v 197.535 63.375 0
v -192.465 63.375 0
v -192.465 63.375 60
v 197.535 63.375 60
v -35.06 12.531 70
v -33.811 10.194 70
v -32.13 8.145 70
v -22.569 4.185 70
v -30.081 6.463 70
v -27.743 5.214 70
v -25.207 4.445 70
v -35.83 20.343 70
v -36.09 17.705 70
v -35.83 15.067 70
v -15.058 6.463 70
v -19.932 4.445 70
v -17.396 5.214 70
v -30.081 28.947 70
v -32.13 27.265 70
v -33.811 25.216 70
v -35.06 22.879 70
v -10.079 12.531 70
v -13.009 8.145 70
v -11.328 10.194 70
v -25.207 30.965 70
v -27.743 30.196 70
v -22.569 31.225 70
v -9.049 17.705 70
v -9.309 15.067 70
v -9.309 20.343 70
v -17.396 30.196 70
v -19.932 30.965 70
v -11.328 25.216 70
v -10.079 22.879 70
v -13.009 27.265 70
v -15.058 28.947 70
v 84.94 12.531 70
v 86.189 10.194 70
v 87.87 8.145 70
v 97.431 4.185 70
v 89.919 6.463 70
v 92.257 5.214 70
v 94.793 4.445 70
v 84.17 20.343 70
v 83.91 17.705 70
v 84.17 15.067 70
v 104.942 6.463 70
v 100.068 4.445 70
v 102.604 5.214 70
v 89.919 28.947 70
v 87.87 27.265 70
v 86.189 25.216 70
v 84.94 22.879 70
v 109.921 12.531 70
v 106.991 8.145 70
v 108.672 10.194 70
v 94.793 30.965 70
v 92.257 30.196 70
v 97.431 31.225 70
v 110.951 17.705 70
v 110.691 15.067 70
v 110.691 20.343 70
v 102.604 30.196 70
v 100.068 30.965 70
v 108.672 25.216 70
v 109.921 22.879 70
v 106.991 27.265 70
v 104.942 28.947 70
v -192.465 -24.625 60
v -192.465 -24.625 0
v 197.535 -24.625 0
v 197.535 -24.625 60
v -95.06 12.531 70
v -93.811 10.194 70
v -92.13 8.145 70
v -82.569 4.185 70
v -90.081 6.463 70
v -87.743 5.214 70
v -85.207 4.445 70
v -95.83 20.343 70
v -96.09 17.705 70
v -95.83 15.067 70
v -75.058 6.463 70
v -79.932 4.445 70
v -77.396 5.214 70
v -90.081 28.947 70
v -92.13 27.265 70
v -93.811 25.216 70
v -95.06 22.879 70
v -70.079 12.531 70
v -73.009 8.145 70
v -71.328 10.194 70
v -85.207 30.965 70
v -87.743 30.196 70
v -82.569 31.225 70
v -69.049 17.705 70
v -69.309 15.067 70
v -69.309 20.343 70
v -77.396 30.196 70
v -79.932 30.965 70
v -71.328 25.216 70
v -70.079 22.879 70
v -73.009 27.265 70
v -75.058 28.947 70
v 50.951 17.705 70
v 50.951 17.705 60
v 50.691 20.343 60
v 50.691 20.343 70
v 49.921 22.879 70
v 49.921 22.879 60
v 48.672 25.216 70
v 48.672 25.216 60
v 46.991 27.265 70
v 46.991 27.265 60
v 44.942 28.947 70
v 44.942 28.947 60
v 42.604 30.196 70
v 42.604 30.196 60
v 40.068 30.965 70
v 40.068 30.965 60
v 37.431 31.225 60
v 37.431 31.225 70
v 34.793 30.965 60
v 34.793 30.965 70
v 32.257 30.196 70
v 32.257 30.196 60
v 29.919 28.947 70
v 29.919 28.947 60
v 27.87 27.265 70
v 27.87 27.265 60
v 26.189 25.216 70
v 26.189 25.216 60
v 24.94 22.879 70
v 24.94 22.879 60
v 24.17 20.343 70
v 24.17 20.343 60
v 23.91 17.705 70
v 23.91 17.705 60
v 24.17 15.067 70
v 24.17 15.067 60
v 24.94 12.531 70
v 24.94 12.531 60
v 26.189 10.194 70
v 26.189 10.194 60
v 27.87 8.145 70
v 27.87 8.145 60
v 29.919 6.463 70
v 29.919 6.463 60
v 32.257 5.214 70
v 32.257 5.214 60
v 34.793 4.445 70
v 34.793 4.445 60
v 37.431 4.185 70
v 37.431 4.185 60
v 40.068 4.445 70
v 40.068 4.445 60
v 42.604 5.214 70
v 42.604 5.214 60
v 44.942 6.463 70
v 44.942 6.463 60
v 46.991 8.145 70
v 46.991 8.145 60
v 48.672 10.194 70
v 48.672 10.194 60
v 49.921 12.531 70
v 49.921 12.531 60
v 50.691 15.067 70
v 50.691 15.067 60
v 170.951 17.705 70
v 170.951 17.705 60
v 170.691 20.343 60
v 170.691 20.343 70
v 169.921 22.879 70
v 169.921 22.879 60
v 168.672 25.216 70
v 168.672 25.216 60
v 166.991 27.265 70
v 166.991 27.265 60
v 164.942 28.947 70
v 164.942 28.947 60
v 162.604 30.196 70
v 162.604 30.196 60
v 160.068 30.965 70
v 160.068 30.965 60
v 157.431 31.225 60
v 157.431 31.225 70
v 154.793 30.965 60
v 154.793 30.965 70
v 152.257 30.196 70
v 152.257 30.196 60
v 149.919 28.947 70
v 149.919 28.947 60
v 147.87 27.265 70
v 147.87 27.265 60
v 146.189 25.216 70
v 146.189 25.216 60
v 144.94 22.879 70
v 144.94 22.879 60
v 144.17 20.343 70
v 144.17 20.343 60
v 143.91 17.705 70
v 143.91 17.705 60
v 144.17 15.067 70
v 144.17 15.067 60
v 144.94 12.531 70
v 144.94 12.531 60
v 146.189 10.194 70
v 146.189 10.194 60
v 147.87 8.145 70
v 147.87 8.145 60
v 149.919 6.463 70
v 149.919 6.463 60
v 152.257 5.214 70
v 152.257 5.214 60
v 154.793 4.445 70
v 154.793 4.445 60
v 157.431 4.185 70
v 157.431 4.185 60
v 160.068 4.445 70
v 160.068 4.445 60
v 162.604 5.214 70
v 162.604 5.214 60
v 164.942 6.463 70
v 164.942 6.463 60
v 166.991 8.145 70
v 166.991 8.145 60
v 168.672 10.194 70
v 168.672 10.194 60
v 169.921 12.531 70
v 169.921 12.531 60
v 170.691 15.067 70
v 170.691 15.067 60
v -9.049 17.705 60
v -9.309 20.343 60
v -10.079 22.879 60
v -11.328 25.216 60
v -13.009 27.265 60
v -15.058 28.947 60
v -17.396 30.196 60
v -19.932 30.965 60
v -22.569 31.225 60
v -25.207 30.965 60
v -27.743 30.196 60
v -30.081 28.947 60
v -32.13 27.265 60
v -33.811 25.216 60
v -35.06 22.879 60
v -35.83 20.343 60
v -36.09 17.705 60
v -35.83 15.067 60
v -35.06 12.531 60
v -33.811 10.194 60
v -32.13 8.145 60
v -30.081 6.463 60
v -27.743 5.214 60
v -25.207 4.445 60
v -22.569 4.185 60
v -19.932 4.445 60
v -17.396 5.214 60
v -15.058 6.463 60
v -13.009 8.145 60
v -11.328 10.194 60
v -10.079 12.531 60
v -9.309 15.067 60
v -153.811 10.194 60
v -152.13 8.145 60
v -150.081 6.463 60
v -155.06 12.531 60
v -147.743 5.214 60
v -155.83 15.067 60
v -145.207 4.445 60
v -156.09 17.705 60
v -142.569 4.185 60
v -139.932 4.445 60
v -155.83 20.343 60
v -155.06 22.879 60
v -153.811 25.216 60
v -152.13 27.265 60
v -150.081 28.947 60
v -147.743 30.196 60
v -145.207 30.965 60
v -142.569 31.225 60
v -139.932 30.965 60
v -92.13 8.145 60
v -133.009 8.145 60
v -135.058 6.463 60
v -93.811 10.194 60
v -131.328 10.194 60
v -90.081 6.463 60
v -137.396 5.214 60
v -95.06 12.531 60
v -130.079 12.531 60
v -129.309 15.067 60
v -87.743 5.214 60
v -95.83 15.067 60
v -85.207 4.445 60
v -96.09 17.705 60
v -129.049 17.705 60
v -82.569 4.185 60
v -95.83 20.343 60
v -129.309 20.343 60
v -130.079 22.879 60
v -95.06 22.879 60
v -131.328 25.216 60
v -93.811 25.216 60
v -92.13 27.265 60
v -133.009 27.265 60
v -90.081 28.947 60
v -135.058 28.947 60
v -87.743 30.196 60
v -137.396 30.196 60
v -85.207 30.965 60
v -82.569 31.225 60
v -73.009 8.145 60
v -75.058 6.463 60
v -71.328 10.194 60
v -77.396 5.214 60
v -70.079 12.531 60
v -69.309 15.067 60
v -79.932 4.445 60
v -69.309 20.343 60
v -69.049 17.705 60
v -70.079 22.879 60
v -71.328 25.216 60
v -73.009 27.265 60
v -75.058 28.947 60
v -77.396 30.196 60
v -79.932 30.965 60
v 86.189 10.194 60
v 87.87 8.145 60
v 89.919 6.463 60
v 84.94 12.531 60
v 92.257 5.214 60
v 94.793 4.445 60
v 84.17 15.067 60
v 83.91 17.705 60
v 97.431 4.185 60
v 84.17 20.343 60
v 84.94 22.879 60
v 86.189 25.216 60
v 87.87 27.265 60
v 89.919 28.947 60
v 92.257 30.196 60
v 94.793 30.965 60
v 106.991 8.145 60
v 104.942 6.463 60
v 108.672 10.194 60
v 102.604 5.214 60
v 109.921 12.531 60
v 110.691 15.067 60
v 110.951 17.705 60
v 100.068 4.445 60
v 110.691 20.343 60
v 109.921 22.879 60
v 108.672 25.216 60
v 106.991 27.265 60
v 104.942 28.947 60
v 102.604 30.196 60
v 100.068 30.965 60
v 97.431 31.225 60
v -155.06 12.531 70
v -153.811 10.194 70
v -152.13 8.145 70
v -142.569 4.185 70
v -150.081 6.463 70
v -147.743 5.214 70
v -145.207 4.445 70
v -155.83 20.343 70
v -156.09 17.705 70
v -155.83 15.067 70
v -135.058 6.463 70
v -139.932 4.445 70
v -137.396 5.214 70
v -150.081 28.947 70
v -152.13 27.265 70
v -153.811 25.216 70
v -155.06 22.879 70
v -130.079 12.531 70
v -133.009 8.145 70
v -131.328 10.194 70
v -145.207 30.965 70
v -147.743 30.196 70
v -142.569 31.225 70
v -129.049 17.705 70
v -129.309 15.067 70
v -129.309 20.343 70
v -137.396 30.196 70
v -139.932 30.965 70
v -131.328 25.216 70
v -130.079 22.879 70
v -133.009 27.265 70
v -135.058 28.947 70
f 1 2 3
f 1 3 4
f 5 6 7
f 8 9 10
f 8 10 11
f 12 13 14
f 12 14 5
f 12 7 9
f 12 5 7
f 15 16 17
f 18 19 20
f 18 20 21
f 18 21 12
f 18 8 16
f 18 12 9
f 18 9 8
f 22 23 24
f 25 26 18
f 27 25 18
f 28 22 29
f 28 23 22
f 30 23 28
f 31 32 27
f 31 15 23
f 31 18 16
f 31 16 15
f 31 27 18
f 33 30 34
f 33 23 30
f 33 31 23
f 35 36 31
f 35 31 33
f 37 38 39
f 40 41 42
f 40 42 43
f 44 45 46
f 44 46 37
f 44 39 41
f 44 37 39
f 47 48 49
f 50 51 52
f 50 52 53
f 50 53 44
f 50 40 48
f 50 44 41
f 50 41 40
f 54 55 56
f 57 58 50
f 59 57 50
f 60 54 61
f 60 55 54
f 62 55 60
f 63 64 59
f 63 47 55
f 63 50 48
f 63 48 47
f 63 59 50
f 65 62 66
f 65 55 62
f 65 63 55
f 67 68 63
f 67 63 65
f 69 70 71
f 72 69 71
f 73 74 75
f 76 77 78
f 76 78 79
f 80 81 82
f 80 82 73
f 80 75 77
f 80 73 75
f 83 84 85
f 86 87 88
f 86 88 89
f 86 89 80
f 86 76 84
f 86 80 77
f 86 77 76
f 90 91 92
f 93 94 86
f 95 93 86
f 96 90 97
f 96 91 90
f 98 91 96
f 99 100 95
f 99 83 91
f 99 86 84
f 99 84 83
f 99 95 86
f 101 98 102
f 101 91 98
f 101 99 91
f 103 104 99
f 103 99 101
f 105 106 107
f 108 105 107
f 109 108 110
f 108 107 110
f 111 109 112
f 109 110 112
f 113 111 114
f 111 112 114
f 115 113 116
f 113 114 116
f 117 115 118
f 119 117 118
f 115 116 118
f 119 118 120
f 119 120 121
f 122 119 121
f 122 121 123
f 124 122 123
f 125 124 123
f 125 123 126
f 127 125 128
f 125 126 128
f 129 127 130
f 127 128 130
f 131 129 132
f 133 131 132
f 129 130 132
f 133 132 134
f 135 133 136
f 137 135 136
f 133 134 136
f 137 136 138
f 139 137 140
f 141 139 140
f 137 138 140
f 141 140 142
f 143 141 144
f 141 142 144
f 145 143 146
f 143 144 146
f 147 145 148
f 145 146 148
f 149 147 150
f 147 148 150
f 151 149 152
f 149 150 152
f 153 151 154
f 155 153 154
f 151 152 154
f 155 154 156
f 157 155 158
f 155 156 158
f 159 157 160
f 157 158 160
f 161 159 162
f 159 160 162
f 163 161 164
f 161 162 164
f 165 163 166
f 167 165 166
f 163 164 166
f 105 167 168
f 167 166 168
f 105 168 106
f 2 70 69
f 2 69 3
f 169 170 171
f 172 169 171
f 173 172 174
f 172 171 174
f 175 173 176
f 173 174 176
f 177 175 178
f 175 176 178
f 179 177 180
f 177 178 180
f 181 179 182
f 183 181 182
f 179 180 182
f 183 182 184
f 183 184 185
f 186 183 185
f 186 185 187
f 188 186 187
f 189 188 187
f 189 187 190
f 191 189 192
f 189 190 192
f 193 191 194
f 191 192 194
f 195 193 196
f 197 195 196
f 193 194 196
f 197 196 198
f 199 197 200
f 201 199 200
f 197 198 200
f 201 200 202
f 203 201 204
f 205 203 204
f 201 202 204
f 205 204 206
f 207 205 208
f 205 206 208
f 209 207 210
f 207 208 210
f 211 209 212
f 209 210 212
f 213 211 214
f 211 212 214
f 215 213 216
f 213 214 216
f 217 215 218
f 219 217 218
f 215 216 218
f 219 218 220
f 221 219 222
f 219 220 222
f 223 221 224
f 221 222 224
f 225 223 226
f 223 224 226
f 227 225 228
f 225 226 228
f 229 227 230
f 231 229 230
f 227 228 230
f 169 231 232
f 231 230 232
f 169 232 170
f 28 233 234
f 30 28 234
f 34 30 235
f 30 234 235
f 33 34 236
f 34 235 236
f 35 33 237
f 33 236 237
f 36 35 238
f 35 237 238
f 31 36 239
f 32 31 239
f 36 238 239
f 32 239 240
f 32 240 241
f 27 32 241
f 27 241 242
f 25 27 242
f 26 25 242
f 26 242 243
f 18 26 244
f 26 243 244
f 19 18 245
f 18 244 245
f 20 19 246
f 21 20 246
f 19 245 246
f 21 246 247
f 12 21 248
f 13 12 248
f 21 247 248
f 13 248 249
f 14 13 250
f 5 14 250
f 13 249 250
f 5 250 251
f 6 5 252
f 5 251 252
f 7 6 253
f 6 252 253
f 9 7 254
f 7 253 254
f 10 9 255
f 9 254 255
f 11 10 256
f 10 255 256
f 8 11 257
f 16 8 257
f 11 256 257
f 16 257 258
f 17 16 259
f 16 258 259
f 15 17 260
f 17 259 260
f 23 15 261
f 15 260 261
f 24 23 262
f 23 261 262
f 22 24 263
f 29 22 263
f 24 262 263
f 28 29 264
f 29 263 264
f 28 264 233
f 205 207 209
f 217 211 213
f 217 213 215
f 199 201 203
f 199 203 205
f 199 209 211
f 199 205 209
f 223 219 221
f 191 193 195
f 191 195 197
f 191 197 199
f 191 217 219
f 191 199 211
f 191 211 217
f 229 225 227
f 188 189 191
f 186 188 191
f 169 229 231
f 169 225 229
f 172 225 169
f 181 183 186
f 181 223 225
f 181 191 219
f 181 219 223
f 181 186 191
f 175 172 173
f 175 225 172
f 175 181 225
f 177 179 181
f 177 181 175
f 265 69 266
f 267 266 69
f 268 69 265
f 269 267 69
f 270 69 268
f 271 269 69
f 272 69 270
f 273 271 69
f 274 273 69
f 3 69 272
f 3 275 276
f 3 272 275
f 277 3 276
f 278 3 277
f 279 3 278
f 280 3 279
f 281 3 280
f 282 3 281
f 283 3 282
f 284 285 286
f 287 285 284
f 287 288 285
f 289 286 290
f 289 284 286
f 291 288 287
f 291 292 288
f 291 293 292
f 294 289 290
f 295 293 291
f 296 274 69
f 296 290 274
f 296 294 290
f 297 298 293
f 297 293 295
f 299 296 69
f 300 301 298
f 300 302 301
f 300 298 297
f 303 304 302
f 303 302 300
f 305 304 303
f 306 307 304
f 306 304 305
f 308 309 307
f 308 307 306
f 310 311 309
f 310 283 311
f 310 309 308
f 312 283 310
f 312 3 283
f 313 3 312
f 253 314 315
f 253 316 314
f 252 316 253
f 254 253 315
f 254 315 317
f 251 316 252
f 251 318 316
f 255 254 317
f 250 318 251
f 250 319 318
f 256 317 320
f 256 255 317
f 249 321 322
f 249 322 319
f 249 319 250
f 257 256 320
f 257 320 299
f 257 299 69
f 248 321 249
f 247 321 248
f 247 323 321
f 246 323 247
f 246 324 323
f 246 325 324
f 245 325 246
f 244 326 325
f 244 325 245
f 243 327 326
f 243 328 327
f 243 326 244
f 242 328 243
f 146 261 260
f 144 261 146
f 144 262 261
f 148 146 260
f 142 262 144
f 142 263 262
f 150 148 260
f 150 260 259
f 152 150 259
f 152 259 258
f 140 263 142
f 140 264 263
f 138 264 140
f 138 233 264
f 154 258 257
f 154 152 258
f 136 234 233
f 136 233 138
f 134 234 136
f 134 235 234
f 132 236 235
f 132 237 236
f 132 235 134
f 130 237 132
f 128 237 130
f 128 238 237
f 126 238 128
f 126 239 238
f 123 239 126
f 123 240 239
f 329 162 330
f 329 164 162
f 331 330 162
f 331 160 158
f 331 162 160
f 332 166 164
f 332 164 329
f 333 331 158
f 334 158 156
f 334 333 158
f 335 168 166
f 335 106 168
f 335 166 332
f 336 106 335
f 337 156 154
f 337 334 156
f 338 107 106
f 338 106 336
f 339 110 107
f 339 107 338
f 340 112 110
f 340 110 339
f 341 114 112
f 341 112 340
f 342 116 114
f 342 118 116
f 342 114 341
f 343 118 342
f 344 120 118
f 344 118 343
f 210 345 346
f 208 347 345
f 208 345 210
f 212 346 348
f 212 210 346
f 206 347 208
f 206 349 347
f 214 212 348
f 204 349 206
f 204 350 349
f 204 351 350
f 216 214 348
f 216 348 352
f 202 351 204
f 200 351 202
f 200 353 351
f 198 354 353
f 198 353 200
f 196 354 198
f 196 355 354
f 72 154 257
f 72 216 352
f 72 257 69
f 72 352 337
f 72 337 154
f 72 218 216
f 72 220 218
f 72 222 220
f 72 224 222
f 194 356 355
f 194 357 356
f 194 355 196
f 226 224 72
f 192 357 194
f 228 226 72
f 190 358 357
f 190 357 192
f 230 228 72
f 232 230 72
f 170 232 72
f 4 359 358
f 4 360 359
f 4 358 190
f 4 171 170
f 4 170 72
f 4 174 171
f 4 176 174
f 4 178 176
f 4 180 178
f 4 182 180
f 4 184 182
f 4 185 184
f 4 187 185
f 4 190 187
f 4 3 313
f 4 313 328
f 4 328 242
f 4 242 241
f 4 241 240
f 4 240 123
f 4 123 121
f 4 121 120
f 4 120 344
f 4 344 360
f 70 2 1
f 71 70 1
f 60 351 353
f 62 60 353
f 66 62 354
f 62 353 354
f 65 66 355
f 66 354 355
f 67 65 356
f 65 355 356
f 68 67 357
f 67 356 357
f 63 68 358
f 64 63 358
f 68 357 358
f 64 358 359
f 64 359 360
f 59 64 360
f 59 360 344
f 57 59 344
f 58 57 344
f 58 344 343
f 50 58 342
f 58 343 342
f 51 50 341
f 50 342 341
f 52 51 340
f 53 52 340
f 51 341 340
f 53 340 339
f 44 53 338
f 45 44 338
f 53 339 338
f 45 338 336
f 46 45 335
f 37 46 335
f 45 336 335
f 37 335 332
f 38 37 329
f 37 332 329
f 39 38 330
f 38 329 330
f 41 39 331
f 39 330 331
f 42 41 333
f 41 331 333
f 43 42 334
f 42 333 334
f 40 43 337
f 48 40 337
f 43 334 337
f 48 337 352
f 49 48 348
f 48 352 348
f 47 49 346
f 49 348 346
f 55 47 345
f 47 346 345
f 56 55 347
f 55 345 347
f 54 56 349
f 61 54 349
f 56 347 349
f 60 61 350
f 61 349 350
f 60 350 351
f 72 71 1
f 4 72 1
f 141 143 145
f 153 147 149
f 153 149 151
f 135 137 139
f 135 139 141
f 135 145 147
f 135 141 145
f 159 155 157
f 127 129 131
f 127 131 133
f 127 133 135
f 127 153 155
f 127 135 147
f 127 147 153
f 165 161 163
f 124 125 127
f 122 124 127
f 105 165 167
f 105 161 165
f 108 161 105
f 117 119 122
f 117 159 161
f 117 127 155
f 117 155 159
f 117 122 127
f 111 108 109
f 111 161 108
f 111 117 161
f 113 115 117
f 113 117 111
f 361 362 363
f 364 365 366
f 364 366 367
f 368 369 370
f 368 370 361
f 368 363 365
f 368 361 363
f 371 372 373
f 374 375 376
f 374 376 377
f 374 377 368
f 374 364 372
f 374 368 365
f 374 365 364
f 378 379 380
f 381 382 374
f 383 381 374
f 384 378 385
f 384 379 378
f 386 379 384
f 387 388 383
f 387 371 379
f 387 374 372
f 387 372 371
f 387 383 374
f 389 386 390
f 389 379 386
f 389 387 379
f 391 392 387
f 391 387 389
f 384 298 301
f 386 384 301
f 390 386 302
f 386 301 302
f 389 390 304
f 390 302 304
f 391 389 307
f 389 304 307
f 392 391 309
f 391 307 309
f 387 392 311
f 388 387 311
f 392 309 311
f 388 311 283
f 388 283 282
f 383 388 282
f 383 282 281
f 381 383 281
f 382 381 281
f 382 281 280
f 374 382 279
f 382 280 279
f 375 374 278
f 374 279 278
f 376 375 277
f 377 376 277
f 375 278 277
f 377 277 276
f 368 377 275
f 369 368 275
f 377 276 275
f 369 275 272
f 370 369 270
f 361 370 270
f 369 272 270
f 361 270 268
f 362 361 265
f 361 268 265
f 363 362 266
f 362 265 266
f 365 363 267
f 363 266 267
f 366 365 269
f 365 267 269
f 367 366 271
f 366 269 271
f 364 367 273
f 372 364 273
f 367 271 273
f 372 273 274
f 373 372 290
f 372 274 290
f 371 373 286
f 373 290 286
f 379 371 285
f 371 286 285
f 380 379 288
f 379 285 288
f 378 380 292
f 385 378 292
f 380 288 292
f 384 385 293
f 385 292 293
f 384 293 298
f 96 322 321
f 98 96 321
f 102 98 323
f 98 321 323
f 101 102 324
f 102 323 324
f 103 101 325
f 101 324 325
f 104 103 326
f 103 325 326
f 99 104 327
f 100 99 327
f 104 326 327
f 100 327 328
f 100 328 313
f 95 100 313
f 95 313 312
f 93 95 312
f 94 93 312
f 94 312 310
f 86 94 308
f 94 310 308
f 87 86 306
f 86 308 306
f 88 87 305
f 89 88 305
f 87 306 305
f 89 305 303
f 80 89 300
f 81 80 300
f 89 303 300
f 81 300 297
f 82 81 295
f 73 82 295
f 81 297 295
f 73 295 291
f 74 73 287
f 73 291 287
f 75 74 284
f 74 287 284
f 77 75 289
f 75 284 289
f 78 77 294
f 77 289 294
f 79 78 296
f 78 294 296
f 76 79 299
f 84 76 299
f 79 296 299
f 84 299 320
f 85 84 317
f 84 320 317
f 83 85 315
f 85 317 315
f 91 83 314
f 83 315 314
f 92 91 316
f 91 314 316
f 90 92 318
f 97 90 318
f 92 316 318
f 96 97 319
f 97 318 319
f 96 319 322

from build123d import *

# Parameters (mm, degrees)
SKETCH1_W           = 390
SKETCH1_H           = 88
BOSS_EXTRUDE1_DEPTH = 60
SKETCH2_R           = 13.520117845
BOSS_EXTRUDE2_DEPTH = 10
LPATTERN1_COUNT     = 6
LPATTERN1_PITCH     = 60


with BuildPart() as part:
    # Sketch1 → Boss-Extrude1 (new body)
    with BuildSketch(Plane.XY):
        with Locations((2.535, 19.375)):
            Rectangle(SKETCH1_W, SKETCH1_H)
    extrude(amount=BOSS_EXTRUDE1_DEPTH)

    # Sketch2 → Boss-Extrude2 (add)
    with BuildSketch(Plane.XY.offset(60)):
        with Locations((-142.569495457, 17.704999413)):
            Circle(SKETCH2_R)
    boss_extrude2 = extrude(amount=BOSS_EXTRUDE2_DEPTH)

    # LPattern1: Boss-Extrude2 ×6
    with Locations(*[(i * LPATTERN1_PITCH, 0, 0) for i in range(1, LPATTERN1_COUNT)]):
        add(boss_extrude2)


solid = part.part
